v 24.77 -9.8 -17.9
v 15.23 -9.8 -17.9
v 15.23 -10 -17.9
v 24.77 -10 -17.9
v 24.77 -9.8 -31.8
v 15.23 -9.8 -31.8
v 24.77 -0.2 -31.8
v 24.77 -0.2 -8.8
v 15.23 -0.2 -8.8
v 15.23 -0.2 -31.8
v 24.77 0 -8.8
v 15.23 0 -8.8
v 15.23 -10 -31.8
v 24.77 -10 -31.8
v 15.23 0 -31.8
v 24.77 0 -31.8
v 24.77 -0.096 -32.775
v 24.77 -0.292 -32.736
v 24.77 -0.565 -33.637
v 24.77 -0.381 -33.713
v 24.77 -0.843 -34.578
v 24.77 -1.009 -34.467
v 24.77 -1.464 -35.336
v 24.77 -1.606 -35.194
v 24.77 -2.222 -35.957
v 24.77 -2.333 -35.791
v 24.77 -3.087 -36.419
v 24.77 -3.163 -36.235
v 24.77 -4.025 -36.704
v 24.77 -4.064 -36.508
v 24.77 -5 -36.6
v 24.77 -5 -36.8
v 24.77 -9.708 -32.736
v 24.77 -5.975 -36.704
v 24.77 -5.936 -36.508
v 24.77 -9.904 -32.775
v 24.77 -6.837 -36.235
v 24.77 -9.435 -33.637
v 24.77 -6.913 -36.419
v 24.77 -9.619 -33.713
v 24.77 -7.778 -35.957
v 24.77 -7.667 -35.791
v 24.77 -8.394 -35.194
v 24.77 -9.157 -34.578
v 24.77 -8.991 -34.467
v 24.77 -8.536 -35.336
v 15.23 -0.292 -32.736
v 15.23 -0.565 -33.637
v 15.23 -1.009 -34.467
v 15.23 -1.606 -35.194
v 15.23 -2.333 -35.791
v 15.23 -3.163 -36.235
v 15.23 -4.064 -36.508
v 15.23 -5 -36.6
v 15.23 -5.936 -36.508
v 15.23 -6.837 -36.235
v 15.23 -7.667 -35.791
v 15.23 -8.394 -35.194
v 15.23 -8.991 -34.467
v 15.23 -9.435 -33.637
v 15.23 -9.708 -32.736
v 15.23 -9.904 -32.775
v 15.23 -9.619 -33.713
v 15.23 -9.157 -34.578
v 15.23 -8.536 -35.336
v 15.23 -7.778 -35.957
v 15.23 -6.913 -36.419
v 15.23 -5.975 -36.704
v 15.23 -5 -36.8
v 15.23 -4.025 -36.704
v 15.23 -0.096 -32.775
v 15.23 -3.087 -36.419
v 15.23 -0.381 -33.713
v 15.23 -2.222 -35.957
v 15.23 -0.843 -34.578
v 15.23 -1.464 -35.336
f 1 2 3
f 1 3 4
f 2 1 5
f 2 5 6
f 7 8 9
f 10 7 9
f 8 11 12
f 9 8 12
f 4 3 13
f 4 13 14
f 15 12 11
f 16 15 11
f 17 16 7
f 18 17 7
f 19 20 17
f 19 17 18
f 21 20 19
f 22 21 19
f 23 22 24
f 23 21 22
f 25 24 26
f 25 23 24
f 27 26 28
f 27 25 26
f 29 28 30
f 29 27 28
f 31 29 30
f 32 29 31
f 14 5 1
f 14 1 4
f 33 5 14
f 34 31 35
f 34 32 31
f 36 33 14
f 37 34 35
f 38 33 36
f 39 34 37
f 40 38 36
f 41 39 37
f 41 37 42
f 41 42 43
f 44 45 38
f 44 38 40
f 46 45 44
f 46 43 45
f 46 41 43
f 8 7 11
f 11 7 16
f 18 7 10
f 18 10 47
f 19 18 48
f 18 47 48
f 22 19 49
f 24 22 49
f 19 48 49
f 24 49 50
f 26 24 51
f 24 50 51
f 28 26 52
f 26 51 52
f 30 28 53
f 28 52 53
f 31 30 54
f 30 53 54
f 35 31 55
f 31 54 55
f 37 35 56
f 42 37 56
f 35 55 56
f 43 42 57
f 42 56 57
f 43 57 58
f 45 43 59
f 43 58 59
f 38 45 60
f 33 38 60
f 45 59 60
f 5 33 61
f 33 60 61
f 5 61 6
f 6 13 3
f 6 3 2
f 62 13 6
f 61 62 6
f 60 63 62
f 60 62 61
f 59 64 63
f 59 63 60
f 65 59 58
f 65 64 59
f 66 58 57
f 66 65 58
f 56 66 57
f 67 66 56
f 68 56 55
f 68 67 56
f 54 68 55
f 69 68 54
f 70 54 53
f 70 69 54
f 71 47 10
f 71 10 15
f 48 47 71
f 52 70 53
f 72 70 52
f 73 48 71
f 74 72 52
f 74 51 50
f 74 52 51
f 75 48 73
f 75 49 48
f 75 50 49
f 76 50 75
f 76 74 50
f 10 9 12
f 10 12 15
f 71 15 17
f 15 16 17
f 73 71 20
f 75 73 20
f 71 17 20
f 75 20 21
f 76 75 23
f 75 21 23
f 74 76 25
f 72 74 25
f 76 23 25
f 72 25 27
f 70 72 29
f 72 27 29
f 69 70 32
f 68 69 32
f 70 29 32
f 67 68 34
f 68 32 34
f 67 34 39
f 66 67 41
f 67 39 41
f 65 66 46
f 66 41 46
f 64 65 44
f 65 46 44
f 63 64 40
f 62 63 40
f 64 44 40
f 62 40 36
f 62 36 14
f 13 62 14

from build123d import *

# Parameters (mm, degrees)
SKETCH_1_W = 9.54
SKETCH_1_H = 0.2


with BuildPart() as part:
    # 스윕1: sweep along a path in 스케치3
    with BuildLine(Plane(origin=(20, 0, 0), x_dir=(0, 0, -1), z_dir=(1, 0, 0))) as sweep_1_path:
        Line((8.8, 0), (31.8, 0))
        ThreePointArc((31.8, 0), (36.8, -5), (31.8, -10))
        Line((31.8, -10), (17.9, -10))
    # 스케치1 → 스윕1 (sweep)
    with BuildSketch(Plane(origin=(0, 0, -8.8), x_dir=(-1, 0, 0), z_dir=(0, 0, -1))):
        with Locations((-20, -0.1)):
            Rectangle(SKETCH_1_W, SKETCH_1_H)
    sweep(path=sweep_1_path.line)


solid = part.part
